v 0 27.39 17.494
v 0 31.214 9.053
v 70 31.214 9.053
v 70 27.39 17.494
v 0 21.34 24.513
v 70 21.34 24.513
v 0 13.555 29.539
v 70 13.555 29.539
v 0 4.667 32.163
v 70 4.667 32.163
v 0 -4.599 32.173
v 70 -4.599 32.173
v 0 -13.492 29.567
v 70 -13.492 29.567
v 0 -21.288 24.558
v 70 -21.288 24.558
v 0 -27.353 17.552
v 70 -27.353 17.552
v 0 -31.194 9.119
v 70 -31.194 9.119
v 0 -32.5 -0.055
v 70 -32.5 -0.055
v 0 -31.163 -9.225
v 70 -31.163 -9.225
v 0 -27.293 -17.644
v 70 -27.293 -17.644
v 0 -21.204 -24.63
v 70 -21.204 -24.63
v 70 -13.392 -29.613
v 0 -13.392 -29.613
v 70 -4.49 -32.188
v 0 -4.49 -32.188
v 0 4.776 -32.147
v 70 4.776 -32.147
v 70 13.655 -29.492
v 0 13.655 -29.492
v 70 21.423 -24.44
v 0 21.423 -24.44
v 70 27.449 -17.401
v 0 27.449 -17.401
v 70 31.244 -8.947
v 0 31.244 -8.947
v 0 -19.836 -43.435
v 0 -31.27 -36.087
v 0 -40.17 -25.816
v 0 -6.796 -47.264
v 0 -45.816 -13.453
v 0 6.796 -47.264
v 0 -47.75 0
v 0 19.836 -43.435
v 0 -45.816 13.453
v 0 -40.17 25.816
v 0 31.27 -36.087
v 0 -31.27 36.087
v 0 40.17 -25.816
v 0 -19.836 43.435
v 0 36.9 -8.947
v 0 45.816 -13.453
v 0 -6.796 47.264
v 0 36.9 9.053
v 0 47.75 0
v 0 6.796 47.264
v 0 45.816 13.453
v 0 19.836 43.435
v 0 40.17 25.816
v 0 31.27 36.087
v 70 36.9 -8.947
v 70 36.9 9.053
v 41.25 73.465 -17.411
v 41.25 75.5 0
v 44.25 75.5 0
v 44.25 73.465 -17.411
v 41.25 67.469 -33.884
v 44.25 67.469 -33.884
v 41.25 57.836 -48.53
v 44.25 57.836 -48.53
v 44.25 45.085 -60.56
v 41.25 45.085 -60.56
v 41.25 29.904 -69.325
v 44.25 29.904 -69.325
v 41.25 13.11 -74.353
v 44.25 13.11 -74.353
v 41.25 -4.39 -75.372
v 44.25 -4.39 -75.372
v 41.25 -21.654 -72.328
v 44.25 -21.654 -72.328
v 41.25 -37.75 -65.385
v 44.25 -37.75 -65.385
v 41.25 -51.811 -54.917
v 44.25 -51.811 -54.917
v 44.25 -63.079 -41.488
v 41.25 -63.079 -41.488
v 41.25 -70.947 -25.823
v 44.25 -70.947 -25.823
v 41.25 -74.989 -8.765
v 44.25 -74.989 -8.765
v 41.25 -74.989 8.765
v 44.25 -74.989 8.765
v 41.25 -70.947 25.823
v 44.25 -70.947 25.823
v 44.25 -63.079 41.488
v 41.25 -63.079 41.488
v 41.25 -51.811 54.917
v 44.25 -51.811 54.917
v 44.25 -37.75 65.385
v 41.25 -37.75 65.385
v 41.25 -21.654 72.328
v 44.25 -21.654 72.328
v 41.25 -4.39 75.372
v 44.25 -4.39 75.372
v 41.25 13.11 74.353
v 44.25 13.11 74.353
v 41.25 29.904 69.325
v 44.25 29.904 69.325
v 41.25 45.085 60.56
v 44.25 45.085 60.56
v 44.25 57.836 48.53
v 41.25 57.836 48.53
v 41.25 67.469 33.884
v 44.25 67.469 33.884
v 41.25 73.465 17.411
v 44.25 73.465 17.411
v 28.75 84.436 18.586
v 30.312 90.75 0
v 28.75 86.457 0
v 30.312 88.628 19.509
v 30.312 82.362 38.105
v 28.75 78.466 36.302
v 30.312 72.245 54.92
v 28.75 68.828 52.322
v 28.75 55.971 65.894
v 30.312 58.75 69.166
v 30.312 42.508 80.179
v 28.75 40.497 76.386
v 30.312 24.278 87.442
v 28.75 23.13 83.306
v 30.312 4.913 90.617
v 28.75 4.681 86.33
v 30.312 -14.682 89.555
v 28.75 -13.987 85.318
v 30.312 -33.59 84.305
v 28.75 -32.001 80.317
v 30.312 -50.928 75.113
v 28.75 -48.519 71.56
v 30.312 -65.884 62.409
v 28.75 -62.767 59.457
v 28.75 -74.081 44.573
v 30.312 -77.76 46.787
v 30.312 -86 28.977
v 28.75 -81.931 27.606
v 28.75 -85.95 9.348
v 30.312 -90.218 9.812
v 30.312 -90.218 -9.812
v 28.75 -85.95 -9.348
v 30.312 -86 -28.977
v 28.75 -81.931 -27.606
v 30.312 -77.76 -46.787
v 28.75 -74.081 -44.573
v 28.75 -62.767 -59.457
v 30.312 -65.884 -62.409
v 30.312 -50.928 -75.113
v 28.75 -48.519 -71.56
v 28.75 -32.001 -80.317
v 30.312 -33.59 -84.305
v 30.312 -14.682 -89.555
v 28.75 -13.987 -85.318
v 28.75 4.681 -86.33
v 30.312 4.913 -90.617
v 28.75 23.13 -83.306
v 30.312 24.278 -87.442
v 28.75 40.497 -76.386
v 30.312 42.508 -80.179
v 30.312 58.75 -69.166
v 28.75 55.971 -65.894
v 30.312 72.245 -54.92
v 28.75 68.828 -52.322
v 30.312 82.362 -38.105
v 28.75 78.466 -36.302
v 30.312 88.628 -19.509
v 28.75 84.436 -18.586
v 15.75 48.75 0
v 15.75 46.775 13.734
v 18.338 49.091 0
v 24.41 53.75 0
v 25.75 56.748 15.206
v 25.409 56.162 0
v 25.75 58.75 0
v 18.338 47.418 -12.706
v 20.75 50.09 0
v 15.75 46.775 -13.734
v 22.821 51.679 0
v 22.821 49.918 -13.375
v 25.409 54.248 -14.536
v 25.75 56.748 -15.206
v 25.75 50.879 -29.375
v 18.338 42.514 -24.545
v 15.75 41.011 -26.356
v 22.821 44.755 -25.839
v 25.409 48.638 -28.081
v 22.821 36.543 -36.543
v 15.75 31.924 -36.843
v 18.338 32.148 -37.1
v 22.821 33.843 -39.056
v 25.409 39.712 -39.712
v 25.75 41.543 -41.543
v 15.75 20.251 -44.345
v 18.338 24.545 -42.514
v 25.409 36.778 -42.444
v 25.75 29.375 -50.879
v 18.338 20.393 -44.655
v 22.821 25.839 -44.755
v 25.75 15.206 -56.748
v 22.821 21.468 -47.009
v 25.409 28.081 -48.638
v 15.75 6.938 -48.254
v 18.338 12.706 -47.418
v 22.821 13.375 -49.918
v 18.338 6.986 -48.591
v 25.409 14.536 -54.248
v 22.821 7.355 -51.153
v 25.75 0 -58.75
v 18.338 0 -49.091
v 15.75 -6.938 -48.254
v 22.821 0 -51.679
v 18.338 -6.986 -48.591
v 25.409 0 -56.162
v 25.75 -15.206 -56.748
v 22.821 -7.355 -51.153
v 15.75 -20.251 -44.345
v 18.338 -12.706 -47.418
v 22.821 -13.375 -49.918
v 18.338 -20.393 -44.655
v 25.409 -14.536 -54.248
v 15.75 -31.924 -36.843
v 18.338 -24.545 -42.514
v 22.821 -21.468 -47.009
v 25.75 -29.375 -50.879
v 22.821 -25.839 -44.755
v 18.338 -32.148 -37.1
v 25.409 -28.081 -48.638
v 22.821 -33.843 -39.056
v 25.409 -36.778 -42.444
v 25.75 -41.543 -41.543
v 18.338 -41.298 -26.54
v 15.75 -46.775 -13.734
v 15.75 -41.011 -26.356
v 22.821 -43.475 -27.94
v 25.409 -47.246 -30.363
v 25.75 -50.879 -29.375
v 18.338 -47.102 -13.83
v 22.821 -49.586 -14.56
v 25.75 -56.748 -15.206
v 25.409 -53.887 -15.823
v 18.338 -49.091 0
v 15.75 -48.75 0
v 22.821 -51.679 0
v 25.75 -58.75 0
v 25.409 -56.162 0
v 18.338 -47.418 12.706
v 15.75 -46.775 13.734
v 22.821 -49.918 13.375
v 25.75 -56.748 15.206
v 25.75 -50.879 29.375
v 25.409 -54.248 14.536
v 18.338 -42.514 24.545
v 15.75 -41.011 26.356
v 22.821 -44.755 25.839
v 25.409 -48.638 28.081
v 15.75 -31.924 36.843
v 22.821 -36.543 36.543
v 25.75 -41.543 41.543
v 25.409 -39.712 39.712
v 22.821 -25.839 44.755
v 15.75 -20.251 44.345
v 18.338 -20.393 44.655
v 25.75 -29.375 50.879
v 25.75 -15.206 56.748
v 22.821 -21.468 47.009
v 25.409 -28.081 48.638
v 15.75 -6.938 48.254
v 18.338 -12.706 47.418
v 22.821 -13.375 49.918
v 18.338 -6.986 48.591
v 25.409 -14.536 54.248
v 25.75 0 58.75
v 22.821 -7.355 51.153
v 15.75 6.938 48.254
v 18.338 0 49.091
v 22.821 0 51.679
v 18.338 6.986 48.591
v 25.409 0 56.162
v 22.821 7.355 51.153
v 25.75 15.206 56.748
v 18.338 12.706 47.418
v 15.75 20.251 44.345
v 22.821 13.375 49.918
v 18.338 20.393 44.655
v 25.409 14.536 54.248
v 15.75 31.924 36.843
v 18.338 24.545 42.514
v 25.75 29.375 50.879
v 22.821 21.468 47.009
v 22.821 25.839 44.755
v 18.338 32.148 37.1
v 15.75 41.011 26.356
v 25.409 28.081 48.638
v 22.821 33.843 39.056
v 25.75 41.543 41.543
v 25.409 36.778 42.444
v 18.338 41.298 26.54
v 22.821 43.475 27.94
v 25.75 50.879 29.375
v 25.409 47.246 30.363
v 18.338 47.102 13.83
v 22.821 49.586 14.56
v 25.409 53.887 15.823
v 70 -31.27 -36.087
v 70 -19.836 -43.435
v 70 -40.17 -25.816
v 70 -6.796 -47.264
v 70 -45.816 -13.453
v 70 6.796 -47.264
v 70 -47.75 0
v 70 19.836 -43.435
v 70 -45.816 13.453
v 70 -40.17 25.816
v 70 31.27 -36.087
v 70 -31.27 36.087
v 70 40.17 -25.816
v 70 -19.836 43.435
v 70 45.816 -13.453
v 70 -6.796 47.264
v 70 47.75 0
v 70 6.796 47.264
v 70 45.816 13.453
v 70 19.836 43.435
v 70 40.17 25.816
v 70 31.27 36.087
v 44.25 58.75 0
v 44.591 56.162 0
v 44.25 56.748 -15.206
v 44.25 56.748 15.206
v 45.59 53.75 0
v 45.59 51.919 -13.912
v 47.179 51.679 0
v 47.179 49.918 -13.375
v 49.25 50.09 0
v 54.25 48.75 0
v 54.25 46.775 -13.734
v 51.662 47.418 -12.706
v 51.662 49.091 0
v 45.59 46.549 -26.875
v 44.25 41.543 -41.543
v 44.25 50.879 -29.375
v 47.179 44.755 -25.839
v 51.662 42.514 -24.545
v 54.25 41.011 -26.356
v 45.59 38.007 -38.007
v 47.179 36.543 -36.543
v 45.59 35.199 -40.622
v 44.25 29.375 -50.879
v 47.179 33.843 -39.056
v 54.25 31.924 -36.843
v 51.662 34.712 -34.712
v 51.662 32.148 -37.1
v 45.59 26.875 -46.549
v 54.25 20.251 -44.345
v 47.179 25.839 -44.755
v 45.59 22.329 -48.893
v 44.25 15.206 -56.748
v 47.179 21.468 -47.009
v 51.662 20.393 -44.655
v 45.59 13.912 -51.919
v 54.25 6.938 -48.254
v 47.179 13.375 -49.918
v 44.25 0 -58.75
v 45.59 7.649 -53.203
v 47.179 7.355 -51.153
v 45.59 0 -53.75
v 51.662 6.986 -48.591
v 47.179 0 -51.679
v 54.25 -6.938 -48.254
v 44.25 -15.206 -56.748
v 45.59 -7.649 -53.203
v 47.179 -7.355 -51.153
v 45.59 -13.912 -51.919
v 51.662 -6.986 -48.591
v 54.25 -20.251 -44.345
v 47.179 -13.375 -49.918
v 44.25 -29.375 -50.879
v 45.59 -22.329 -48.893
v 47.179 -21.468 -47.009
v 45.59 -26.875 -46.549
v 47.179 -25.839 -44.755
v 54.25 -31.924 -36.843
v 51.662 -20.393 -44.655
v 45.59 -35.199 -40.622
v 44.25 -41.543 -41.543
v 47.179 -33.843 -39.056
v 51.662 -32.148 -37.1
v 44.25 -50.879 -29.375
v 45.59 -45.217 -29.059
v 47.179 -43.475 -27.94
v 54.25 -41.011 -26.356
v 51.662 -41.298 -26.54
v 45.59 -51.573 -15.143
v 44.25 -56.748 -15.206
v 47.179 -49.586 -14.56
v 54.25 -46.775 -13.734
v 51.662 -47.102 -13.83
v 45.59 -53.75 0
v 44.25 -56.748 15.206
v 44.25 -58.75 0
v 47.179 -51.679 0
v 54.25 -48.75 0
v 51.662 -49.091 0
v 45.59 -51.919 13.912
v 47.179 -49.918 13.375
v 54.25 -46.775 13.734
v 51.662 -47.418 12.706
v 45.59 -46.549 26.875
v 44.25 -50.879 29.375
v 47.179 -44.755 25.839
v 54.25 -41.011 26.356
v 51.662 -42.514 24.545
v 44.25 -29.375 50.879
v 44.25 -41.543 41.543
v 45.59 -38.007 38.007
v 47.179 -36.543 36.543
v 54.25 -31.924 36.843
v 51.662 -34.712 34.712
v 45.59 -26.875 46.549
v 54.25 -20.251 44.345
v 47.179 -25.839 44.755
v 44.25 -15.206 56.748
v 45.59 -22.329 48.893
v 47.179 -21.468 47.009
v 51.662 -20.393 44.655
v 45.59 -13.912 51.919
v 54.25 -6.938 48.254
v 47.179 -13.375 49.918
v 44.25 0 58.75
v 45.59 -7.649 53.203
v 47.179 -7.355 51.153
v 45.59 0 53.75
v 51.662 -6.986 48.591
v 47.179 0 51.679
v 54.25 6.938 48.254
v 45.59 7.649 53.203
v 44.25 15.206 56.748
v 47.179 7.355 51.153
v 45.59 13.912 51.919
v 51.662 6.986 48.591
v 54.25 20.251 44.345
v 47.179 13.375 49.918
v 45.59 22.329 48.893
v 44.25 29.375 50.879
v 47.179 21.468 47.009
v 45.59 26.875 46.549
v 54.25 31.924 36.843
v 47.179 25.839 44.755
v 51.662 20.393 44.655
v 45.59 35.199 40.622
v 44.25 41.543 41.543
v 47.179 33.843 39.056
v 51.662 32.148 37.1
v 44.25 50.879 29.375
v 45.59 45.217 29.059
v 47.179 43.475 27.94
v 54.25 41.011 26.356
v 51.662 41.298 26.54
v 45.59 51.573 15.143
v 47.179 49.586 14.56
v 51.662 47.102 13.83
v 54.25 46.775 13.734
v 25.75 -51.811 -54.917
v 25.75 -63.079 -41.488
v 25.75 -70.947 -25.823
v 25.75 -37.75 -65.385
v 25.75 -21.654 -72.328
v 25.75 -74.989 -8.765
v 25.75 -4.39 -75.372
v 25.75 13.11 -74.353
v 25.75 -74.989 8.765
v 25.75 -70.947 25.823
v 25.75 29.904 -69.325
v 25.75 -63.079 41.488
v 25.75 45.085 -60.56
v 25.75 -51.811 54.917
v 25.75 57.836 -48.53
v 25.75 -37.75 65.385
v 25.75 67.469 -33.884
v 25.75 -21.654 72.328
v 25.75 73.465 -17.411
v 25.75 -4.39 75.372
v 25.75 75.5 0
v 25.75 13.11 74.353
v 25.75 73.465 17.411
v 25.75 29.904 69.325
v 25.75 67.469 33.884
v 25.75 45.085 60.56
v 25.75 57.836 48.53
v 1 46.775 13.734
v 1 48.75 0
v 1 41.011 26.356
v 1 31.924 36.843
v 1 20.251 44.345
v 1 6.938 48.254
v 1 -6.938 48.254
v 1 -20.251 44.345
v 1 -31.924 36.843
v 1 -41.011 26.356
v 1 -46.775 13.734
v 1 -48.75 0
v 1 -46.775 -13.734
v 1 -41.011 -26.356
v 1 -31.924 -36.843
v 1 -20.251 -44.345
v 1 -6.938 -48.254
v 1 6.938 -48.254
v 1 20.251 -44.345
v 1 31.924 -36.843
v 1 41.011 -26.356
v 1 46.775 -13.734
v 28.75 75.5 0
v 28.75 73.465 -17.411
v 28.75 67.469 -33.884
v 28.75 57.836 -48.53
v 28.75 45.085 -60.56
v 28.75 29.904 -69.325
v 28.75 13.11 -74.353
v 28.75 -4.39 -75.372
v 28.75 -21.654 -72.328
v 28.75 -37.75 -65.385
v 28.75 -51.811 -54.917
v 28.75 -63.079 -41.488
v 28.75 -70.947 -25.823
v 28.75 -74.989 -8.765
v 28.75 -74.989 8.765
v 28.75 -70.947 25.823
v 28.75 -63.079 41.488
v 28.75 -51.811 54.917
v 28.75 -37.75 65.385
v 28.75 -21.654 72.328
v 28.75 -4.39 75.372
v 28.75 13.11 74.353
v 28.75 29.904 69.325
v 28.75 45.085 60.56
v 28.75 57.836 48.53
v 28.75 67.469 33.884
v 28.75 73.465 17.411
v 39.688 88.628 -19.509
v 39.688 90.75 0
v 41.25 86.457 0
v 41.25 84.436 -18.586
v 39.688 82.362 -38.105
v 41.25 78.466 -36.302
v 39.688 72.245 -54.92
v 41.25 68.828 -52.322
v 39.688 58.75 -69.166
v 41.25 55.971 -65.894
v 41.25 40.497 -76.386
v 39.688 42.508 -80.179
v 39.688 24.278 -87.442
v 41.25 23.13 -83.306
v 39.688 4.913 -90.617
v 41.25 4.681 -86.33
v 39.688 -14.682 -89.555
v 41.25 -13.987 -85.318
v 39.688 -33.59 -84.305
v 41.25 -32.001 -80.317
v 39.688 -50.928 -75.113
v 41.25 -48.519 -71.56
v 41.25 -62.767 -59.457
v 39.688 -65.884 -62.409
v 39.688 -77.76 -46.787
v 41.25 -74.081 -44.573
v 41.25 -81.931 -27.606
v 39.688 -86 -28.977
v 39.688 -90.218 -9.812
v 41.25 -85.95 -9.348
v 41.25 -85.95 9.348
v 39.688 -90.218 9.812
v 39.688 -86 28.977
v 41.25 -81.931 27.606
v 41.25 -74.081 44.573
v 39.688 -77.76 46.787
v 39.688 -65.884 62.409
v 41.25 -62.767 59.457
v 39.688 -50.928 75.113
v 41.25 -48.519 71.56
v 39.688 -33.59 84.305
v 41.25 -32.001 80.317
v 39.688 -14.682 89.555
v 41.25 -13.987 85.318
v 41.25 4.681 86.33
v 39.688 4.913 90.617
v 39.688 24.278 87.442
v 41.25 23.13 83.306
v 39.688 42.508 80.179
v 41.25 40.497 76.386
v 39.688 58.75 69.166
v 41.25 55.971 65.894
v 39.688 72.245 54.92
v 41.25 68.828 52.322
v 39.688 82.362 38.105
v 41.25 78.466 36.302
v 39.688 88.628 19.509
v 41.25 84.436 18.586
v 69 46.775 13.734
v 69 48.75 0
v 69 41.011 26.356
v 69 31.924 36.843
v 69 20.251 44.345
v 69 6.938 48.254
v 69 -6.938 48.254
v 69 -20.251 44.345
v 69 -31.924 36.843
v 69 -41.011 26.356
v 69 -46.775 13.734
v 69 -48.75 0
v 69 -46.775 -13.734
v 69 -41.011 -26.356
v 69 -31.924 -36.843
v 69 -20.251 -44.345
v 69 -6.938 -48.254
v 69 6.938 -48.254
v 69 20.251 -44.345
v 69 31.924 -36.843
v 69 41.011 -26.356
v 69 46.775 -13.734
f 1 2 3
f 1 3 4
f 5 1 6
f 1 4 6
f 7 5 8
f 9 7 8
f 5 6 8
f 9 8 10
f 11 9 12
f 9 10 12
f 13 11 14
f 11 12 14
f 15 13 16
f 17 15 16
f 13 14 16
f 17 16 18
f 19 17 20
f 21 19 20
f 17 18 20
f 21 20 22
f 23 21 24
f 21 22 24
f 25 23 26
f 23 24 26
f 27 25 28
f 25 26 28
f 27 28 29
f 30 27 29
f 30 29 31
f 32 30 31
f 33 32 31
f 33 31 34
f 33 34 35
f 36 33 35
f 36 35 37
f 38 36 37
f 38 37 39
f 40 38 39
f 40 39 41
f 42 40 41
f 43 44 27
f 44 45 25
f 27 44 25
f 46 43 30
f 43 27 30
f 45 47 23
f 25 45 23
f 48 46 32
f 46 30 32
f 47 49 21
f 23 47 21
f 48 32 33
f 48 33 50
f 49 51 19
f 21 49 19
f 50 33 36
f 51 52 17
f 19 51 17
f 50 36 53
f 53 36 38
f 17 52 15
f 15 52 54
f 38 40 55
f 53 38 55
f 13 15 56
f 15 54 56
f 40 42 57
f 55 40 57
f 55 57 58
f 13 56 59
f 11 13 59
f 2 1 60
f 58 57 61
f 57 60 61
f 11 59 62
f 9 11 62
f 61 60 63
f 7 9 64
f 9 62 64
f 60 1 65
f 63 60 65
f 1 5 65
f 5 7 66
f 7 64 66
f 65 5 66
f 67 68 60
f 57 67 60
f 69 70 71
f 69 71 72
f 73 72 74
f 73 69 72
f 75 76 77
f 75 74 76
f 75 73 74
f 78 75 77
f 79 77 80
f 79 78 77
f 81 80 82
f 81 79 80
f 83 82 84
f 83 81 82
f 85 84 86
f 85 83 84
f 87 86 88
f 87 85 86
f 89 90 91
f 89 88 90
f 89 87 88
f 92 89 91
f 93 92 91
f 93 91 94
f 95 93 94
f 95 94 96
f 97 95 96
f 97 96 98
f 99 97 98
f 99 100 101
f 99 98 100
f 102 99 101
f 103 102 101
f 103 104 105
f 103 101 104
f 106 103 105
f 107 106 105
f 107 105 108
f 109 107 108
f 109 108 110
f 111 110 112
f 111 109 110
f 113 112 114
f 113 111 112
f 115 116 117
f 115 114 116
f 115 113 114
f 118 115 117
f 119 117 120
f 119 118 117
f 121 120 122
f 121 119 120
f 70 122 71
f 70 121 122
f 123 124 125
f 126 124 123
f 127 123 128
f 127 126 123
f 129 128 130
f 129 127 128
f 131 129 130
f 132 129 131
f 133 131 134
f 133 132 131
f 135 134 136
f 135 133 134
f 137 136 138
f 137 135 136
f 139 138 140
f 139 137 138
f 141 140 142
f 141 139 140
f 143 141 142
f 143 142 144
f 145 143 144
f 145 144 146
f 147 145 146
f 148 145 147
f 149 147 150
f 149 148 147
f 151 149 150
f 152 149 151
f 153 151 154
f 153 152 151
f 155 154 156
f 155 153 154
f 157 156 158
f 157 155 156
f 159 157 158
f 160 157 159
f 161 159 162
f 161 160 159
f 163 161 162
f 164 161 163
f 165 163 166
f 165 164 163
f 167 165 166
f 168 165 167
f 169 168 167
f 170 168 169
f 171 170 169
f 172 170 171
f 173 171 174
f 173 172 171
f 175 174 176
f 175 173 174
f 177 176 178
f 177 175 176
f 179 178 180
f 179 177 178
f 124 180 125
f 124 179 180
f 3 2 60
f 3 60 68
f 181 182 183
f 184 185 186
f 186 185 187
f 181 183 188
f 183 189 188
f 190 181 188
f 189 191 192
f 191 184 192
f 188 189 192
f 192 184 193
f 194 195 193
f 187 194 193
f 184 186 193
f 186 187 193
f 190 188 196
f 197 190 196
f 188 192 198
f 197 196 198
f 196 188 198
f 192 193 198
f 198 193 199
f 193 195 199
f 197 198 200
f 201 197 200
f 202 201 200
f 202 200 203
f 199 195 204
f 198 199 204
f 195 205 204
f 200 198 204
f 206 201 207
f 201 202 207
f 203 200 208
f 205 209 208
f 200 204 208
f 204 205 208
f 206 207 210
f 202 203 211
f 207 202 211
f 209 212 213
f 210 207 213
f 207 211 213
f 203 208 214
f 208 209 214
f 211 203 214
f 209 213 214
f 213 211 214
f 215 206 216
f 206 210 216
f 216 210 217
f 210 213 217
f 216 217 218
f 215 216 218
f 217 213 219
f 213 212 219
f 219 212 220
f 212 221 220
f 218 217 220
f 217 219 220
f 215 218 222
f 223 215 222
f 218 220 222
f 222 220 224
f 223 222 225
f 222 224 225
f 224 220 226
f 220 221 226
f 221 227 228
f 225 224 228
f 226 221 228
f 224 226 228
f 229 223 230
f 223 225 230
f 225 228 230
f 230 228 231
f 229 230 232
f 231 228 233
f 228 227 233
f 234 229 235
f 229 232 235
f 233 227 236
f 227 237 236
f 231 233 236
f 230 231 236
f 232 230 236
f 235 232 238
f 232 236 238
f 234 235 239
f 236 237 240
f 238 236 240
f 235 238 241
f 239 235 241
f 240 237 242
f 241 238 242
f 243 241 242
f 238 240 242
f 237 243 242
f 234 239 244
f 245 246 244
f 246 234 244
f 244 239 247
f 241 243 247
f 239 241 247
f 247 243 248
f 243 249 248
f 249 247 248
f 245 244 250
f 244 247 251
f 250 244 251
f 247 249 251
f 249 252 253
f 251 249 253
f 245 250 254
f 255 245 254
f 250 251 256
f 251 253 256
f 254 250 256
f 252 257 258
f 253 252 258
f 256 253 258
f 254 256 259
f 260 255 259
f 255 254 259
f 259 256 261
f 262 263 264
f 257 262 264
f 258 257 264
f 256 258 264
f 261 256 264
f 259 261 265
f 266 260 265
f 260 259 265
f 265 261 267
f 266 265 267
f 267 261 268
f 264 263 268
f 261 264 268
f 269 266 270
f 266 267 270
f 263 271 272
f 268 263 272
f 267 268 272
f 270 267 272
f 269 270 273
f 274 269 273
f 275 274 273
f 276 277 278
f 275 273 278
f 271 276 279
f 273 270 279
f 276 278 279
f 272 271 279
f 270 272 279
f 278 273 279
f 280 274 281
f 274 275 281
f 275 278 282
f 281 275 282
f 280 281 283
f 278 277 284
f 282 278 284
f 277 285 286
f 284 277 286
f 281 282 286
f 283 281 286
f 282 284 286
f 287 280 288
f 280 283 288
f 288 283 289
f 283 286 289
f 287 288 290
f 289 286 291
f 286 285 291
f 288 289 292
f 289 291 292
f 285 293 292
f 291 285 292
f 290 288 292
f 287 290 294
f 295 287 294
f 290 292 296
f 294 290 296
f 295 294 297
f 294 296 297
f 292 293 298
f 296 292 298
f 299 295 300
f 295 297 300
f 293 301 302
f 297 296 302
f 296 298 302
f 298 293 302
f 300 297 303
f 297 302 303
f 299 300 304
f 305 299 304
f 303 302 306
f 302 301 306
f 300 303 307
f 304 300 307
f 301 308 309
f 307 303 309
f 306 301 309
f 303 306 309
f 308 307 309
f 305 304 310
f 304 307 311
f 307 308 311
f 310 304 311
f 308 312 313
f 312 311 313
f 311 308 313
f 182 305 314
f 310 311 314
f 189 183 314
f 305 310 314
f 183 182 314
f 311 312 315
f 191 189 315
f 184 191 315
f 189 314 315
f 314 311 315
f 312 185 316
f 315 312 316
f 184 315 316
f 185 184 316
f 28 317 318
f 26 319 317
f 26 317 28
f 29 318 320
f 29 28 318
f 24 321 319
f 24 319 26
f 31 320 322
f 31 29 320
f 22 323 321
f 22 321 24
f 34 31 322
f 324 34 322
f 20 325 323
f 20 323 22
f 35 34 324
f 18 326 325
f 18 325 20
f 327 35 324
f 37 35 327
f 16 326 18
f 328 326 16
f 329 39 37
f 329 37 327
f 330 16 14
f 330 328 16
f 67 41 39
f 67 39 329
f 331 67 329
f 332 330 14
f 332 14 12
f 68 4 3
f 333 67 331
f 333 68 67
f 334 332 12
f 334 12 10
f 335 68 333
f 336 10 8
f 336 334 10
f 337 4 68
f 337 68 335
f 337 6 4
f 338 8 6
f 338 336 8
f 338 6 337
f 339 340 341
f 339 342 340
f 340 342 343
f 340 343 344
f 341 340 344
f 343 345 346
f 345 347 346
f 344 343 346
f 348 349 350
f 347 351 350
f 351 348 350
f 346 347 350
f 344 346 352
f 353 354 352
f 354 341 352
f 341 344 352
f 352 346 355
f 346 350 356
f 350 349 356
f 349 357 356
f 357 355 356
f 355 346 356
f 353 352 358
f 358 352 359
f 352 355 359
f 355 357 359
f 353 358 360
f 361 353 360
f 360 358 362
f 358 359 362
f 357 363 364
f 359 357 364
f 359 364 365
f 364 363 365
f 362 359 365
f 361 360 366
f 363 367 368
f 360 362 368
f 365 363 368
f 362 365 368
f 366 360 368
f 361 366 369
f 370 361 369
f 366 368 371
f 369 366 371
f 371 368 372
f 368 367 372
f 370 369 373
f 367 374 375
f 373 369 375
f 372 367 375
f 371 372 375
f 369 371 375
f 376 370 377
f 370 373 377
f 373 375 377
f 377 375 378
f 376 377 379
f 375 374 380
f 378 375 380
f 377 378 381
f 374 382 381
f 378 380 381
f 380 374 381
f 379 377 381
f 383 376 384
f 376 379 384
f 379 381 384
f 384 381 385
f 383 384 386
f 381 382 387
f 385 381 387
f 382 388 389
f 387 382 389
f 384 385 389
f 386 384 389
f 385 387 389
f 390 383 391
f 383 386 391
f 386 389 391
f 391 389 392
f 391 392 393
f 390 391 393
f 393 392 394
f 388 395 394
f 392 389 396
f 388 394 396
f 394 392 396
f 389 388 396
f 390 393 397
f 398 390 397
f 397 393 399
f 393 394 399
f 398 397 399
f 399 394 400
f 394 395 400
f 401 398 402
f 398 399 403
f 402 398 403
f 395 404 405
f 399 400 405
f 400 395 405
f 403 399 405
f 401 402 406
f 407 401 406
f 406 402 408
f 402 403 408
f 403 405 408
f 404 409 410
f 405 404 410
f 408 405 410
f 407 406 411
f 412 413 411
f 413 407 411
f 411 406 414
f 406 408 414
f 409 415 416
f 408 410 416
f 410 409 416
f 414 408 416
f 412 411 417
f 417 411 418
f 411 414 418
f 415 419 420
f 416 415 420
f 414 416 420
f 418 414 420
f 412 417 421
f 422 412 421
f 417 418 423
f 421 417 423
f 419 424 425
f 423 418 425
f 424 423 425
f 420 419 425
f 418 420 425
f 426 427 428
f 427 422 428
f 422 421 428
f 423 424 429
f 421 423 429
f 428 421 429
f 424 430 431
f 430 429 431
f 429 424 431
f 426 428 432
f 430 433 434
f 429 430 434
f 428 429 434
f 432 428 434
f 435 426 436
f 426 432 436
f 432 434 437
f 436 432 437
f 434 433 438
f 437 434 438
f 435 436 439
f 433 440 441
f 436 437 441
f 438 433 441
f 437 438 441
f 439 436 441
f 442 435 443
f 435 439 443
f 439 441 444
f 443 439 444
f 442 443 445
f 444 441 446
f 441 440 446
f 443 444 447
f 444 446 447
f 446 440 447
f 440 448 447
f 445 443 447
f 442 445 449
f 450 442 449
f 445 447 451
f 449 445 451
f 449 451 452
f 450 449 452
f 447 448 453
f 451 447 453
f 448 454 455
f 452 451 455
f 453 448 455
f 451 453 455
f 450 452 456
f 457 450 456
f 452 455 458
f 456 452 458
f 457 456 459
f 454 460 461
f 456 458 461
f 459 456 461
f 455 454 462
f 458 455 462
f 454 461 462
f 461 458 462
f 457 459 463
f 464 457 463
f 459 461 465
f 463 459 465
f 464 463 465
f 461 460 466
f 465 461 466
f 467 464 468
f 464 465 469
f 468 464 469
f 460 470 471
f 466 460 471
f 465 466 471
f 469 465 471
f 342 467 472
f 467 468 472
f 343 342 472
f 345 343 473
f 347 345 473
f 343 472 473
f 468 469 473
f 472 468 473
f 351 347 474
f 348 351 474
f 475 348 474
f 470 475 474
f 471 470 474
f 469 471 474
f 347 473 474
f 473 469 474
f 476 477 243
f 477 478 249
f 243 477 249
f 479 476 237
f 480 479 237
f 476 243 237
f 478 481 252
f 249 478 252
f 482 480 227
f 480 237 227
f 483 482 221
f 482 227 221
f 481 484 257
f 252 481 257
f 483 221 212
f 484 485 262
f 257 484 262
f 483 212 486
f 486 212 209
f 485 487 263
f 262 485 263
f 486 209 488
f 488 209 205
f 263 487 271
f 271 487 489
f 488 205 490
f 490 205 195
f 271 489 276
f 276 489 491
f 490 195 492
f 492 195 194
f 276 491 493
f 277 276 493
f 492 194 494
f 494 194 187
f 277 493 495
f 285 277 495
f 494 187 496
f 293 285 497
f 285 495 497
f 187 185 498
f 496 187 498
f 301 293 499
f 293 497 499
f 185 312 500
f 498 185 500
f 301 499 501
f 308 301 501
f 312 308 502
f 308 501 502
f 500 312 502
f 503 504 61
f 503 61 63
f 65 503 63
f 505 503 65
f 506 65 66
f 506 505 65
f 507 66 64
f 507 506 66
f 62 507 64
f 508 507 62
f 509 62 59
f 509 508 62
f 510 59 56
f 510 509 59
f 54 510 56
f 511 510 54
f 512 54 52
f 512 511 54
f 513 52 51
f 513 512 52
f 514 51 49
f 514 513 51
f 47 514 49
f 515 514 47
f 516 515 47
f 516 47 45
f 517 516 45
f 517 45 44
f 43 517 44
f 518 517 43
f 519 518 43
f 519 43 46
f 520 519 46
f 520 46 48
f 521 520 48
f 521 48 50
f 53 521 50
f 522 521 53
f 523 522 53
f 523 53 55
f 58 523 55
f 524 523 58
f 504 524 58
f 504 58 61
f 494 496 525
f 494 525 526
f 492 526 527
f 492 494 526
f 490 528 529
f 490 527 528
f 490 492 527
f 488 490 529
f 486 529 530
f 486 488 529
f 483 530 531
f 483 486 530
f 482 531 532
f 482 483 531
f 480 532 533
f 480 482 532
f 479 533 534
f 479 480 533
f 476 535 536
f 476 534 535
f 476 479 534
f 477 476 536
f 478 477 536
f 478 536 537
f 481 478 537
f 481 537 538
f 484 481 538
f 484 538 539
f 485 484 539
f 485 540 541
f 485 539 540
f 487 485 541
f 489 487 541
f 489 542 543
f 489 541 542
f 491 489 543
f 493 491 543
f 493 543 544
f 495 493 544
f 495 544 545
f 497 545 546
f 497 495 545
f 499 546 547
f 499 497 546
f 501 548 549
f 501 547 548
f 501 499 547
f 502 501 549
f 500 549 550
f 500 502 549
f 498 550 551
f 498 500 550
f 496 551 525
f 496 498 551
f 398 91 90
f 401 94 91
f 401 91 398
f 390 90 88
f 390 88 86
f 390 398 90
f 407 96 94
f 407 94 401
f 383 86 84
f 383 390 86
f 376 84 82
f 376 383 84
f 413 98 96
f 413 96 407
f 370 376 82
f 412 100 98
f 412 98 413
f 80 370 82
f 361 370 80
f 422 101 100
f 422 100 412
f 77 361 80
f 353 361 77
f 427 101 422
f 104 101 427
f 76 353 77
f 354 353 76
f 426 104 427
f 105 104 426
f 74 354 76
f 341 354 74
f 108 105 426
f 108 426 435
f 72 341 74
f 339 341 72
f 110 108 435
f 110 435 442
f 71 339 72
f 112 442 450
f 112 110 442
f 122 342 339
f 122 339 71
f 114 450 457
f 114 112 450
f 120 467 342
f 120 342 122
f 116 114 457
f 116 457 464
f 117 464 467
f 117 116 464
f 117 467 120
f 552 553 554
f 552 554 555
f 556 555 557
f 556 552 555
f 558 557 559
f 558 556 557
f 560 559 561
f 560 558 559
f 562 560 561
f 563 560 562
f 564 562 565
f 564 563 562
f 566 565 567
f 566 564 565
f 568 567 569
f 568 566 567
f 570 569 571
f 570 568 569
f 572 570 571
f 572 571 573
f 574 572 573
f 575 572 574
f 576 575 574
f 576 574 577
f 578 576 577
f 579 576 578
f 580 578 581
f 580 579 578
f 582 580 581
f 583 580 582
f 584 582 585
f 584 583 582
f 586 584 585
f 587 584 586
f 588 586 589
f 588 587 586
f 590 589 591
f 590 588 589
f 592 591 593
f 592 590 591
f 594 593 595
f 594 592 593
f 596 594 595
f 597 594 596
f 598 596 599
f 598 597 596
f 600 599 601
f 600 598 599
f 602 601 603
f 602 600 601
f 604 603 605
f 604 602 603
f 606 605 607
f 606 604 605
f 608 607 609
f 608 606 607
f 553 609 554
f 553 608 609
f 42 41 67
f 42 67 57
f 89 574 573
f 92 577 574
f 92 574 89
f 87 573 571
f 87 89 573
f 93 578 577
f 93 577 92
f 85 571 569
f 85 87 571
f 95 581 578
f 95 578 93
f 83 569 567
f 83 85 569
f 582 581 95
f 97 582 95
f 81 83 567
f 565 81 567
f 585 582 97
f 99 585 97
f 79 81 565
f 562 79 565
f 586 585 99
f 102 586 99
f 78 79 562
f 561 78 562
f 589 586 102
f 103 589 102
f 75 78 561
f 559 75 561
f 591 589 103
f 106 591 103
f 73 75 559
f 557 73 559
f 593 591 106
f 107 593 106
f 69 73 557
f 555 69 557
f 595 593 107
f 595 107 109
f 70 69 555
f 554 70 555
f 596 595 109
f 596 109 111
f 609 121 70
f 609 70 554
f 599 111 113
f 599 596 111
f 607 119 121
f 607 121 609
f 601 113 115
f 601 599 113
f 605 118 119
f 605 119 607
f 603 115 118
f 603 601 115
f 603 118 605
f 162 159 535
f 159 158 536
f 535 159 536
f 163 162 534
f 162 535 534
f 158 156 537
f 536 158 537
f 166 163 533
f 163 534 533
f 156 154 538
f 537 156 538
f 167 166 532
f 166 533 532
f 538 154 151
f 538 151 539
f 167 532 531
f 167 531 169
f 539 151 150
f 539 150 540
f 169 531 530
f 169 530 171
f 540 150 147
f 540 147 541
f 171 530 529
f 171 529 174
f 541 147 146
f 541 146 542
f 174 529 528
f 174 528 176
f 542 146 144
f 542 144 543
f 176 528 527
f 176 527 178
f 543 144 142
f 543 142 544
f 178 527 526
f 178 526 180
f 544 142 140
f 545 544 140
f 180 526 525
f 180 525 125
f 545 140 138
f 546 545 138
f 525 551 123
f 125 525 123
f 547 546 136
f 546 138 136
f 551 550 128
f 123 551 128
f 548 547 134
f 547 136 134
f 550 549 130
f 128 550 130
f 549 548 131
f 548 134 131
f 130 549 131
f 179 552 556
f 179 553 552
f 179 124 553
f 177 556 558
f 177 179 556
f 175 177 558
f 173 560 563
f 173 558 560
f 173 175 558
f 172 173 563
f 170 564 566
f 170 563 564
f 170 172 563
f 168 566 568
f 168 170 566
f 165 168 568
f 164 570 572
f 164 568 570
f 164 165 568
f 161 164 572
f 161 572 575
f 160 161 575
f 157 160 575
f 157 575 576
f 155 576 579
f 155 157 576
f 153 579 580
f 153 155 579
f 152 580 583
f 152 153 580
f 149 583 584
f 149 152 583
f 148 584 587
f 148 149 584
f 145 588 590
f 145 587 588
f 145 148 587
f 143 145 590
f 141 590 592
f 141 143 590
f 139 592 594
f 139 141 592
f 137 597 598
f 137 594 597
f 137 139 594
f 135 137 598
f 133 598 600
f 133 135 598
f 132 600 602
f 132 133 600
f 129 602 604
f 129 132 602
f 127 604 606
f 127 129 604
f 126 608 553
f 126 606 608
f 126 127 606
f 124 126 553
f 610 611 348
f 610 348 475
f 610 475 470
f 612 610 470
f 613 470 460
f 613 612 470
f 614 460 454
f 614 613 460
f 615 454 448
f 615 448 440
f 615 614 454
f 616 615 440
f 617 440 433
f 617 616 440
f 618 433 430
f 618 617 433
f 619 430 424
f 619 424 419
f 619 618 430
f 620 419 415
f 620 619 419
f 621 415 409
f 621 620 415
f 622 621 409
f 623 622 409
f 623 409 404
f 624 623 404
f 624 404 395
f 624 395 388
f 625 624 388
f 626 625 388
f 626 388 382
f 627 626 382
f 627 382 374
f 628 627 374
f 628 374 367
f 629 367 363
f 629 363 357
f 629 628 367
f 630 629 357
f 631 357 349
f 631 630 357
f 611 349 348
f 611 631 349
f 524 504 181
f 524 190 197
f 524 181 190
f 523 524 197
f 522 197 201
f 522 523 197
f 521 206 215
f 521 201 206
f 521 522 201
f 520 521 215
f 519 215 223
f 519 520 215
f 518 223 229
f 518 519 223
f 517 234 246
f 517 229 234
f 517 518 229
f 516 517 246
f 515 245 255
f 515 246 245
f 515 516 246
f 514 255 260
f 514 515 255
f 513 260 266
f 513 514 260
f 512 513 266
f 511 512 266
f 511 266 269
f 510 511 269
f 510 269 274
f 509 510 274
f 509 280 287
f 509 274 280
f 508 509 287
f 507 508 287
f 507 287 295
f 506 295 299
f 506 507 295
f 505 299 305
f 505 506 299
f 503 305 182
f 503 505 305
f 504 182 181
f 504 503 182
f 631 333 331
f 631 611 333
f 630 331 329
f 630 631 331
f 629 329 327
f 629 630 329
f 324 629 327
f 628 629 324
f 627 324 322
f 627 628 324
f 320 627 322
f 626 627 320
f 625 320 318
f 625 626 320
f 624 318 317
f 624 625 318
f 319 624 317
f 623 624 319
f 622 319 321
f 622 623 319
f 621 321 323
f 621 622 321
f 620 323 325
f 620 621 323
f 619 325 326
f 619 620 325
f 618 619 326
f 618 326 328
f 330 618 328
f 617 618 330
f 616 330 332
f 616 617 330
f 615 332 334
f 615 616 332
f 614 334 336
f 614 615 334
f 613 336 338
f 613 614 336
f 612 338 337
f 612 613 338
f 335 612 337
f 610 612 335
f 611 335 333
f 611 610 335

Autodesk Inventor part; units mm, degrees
ref_plane "YZ Plane" through (0, 0, 0) normal (1, 0, 0) x (0, 1, 0)
ref_plane "XY Plane" through (0, 0, 0) normal (0, 0, 1) x (1, 0, 0)
sketch "Эскиз1" plane through (0, 0, 0) normal (0, 0, 1) x (1, 0, 0)
  line L0 (0, 32.5) -> (70, 32.5)
  line L1 (0, 0) -> (109.6934, 0)
  line L2 (0, 32.5) -> (0, 44.804)
  line L3 (35, 68.0113) -> (35, 17.7812) construction
  line L4 (0, 80) -> (70, 80) construction
  line L5 (70, 32.5) -> (0, 32.5)
  line L6 (70, 32.5) -> (70, 44.804)
  line L7 (35, 68.0113) -> (35, 105.8973) construction
  line L8 (35, 90.75) -> (30.3125, 90.75)
  line L9 (30.3125, 90.75) -> (32.3125, 90.75) construction
  line L10 (35, 86.4571) -> (28.75, 86.4571)
  line L11 (30.3125, 90.75) -> (28.75, 86.4571)
  line L12 (28.75, 86.4571) -> (28.75, 75.5)
  line L13 (35, 86.4571) -> (41.25, 86.4571)
  line L14 (39.6875, 90.75) -> (41.25, 86.4571)
  line L15 (41.25, 86.4571) -> (41.25, 75.5)
  line L16 (39.6875, 90.75) -> (35, 90.75)
  line L17 (28.75, 75.5) -> (25.75, 75.5)
  line L18 (25.75, 75.5) -> (25.75, 72.7004)
  line L19 (25.75, 72.7004) -> (25.75, 58.75)
  arc A0 (15.75, 48.75) -> (25.75, 58.75) centre (15.75, 58.75) ccw
  line L20 (35, 90.75) -> (39.6875, 90.75)
  line L21 (35, 86.4571) -> (41.25, 86.4571)
  line L22 (39.6875, 90.75) -> (41.25, 86.4571)
  line L23 (41.25, 86.4571) -> (41.25, 75.5)
  line L24 (44.25, 75.5) -> (44.25, 72.7004)
  line L25 (44.25, 72.7004) -> (44.25, 58.75)
  arc A1 (44.25, 58.75) -> (54.25, 48.75) centre (54.25, 58.75) ccw
  line L26 (44.25, 75.5) -> (41.25, 75.5)
  line L27 (15.75, 48.75) -> (0, 48.75)
  line L28 (0, 48.75) -> (0, 44.804)
  line L29 (54.25, 48.75) -> (70, 48.75)
  line L30 (70, 48.75) -> (70, 43.7446)
  point P0 (0, 46.804)
  point P1 (12.5, 90.75)
  point P2 (57.5, 90.75)
  point P3 (70, 46.804)
  point P4 (57.5, 90.75)
  point P5 (25.75, 42.5)
  dimension "d0" = 65
  dimension "d1" = 70
  dimension "d2" = 160
  dimension "d9" = 45
  dimension "d10" = 70
  dimension "d15" = 2
  dimension "d18" = 2
  dimension "d28" = 4.6875
  dimension "d31" = 6.25
  dimension "d32" = 70
  dimension "d34" = 181.5
  dimension "d35" = 3
  dimension "d36" = 10
ref_plane "РабПлоскость1" through (0, 32.5, 0) normal (0, 1, 0) x (-1, 0, 0)
revolve "Вращение2" add sketch "Эскиз1" angle 360 about axis through (0, 0, 0) along (1, 0, 0)
sketch "Эскиз2" plane through (0, 32.5, 0) normal (0, 1, 0) x (-1, 0, 0)
  line L0 (-70, -8.9471) -> (0, -8.9471)
  line L1 (0, -8.9471) -> (0, 9.0529)
  line L2 (0, 9.0529) -> (-70, 9.0529)
  line L3 (-70, 9.0529) -> (-70, -8.9471)
  line L4 (-70, 32.5) -> (-70, -32.5) projected
  point P0 (0, 0)
  dimension "d21" = 18
  dimension "d22" = 0
  dimension "d23" = 70
extrude "Выдавливание1" cut sketch "Эскиз2" along normal blind 4.4 and the other way blind 19.45
chamfer "Фаска1" distance 1 angle 45 2 edges at (0, -48.75, 0) (70, -48.75, 0)
equation "\"d15\" = d11"
equation "\"d18\" = d17"
equation "\"d17\" = d11"
equation "\"d11\" = 2"
properties part number "звездочка" material "Сталь, углеродистая"
